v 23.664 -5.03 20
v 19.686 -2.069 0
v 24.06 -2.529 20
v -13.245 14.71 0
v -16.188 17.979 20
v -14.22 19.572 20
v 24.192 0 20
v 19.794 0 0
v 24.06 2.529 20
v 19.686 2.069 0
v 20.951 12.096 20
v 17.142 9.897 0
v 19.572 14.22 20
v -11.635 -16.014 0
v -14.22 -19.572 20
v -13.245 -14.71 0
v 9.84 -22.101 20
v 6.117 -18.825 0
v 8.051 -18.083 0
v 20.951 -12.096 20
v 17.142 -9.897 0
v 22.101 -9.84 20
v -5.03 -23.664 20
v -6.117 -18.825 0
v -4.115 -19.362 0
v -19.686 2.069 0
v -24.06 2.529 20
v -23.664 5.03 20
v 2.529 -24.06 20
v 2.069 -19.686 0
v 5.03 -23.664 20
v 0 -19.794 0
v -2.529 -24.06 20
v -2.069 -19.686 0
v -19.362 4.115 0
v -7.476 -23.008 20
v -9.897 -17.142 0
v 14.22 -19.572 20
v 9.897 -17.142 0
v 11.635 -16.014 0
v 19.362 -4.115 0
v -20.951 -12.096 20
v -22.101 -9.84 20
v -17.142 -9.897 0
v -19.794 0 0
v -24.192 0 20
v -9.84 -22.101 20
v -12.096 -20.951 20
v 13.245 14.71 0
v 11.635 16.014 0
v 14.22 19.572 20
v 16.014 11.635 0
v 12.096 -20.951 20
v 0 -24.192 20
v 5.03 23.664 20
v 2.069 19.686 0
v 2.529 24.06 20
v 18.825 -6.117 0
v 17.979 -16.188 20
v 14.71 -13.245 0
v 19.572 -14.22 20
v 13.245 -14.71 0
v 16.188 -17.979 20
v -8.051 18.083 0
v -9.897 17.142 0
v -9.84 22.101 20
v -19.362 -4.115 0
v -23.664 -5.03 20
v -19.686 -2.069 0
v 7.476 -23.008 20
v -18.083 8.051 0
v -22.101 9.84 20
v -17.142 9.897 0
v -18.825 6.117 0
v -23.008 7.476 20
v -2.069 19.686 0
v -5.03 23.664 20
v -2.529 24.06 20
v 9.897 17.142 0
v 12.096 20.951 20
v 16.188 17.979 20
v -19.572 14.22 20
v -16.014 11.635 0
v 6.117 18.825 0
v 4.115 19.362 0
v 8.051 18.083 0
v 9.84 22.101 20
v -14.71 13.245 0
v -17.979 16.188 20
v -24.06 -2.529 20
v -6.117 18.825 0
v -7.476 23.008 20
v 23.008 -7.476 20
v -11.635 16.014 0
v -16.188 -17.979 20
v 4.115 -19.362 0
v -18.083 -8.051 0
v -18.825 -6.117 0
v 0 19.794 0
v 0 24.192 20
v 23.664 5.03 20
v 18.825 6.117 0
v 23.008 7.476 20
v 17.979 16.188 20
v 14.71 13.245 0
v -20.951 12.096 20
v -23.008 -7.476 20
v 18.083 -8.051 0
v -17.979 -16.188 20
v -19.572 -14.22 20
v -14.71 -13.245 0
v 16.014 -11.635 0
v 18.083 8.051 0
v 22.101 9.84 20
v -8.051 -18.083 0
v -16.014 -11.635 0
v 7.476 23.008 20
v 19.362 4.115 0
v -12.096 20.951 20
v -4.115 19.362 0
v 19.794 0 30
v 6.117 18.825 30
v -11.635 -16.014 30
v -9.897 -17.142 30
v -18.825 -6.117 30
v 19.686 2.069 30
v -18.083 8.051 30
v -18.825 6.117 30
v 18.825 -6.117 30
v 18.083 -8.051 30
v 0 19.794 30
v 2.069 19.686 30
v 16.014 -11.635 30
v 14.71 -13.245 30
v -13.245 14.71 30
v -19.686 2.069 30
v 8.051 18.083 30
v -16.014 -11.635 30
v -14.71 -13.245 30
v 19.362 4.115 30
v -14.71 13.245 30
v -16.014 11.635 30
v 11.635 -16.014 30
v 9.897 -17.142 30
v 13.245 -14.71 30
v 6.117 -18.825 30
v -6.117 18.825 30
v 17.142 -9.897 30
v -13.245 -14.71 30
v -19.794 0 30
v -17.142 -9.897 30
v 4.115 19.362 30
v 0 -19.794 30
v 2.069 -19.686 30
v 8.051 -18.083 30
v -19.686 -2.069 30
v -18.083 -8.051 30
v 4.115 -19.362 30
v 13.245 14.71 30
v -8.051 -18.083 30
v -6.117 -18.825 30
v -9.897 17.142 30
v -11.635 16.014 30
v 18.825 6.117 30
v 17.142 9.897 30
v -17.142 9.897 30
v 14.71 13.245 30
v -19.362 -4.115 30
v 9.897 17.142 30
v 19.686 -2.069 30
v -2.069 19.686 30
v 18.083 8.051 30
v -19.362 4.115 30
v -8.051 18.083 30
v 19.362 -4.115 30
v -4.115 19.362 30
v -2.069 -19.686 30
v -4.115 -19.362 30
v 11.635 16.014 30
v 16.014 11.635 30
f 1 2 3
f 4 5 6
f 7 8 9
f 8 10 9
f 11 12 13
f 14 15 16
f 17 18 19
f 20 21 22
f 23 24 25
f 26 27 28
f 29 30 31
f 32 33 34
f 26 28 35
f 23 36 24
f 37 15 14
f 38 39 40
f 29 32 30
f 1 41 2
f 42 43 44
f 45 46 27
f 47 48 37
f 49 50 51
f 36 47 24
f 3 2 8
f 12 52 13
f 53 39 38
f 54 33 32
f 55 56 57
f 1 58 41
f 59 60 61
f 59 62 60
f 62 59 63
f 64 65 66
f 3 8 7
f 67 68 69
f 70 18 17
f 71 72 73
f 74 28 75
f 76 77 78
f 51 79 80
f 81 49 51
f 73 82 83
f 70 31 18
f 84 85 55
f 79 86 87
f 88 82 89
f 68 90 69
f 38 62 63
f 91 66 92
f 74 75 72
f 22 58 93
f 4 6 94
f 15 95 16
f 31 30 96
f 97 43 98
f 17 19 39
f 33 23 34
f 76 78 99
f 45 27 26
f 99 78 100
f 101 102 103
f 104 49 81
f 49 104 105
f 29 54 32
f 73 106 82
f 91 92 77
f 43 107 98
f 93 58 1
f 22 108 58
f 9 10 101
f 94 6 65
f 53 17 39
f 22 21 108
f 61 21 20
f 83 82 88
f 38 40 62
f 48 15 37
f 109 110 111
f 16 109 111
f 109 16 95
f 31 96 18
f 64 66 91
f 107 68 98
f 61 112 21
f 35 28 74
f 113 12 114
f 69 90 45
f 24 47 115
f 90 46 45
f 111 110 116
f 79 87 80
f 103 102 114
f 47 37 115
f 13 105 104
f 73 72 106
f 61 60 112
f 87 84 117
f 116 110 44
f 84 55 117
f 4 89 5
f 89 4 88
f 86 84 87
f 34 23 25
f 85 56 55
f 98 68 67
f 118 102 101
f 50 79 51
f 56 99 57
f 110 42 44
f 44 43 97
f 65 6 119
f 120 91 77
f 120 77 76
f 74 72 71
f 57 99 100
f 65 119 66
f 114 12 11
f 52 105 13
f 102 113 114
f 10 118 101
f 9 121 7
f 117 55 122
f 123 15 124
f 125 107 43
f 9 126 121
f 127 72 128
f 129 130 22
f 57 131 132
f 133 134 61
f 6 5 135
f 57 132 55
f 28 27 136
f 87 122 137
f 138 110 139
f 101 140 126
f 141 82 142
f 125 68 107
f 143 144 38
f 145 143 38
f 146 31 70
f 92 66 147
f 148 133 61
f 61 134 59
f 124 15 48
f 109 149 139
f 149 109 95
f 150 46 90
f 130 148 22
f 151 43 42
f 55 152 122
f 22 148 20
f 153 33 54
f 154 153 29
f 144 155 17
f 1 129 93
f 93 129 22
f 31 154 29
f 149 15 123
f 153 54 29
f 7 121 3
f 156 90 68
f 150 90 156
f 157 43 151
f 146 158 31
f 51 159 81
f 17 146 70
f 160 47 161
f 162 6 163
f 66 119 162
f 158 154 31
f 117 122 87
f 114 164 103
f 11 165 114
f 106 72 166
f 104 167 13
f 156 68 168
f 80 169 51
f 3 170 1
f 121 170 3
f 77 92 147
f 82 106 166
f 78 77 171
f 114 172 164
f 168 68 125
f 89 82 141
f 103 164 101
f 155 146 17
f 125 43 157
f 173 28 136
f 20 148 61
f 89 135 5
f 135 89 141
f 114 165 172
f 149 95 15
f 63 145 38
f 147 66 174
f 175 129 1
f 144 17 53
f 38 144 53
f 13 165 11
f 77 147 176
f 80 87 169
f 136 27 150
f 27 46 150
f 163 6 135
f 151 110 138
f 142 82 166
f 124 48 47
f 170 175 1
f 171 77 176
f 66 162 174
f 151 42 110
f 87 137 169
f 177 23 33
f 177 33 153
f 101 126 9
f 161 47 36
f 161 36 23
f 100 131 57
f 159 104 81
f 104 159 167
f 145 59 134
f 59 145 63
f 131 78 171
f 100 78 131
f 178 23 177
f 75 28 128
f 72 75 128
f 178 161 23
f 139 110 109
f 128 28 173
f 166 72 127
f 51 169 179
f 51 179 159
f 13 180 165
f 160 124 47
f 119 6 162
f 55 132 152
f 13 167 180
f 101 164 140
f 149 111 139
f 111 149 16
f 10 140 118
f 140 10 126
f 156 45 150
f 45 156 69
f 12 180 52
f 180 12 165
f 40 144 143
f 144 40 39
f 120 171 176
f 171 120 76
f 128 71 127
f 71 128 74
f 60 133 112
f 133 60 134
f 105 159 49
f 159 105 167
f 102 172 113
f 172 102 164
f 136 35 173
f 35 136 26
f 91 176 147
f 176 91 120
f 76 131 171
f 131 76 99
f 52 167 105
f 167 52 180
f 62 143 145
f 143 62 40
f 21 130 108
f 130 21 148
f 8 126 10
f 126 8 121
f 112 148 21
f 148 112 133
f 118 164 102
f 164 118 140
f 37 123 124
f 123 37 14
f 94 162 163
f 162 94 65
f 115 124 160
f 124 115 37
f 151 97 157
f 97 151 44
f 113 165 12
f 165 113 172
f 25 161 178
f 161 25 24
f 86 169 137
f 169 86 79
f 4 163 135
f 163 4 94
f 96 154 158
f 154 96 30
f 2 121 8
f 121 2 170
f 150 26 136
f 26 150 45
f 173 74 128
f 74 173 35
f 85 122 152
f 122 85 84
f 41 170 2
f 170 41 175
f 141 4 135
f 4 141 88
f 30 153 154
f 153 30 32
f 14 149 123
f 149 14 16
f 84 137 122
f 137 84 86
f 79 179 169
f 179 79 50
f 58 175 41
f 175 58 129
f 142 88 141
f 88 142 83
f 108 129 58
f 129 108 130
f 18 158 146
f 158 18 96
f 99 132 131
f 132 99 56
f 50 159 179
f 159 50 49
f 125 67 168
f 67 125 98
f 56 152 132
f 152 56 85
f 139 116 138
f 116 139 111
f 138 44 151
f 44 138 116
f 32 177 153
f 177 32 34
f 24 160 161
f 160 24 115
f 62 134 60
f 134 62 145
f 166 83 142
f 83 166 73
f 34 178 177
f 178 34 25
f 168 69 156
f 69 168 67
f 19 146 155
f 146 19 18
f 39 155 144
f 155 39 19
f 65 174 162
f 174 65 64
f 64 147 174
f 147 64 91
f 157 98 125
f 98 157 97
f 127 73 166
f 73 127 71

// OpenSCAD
// file: ../lib/hull.scad
/*
hull.scad - a library that leverages the hull() procedure
Author: Elliot Williams
github: https://gist.github.com/hexagon5un )
source: https://gist.github.com/hexagon5un/73e187dfa0404c69177795424f397ce6#file-hull-scad

Featured in the hackaday atricle: 'OPENSCAD: TIEING IT TOGETHER WITH HULL()'
https://hackaday.com/2018/02/13/openscad-tieing-it-together-with-hull/
*/
module multiHull(){
	for (i = [1 : $children-1])
		hull(){
			children(0);
			children(i);
		}
}

module sequentialHull(){
	for (i = [0: $children-2])
		hull(){
			children(i);
			children(i+1);
		}
}

/* Extended fun hull functions */ 

module cylinders(points, diameter, thickness){
	for (p=points){
		translate(p) cylinder(d=diameter, h=thickness, center=true);
	}
}

module plate(points, diameter, thickness, hole_diameter){
	difference(){
		hull() cylinders(points, diameter, thickness);
		cylinders(points, hole_diameter, 1000);
	}
}

module bar(length, width, thickness, hole_diameter){
	plate([[0,0,0], [length,0,0]], width, thickness, hole_diameter);
}

module rounded_box(points, radius, height, facets=30){
	hull(){
		for (p = points){
			translate(p)
				cylinder(r=radius, h=height, $fn=facets);
		}
	}
}

module point_cloud(points, radius=1, facets=8){
	for (p=points){
		translate(p)
			sphere(radius/cos(180/facets), $fn=facets);
		// polygon sphere circumscribed on radius
	}
}

module point_hull(points, radius=1, facets=8){
	hull(){
		point_cloud(points, radius, facets);
	}
}

// Shrink the exterior of the points so that the hull fits inside
function select(vector, i) = [ for (p=vector) p[i] ];
function axis_center(v, i) = (max(select(v, i)) - min(select(v,i)))/2;
function center(v) = [ for (i = [0,1,2]) axis_center(v, i) ];
function shrink_point(point, center, radius) = [ for (i = [0,1,2]) point[i] > center[i] ? point[i] - radius : point[i] + radius ]; 
function shrink(points, radius) = [ for (p = points) shrink_point(p, center(points), radius) ];

module interior_point_hull(points, radius=1){
	point_hull(shrink(points, radius), radius);
}

module interior_rounded_box(points, radius, height){
	rounded_box(shrink(points, radius), radius, height);
}


module mirror_copy(v = [1, 0, 0]) {
    children();
    mirror(v) children();
}
// file: ../lib/utils.scad
///< Utilities

function rand_clr() = rands( 0,1,3 );

///< Length conversions
function in2mm( i ) = ( i * 25.4 ); 
function mm2in( m ) = ( m / 25.4 );

/// This is pulled from stackoverflow
/// https://stackoverflow.com/questions/45826208/openscad-rotating-around-a-particular-point

// rotate as per a, v, but around point pt
module rotate_about_pt(a, v, pt) {
    translate(pt)
        rotate(a,v)
            translate(-pt)
                children();   
}
// file: ../lib/math.scad
///< Math scad module


///< Find the hypotenuse from two sides of a right triangle
function hyp_from_sides( a, b ) = sqrt( pow( a, 2 ) + pow( b, 2 ) );

///< Find equal sides from hypotenuse of a right triangle
function sides_from_hyp(h) = sqrt( pow( h, 2 ) / 2 );

///< Find A from hypotenuse and B
function a_from_hb( h, b ) = sqrt( pow( h, 2 ) - pow( b, 2 ) );

function dist_2d( pt2, pt1 ) = sqrt(pow(( pt2[0]-pt1[0] ),2) + pow(( pt2[1]-pt1[1]),2) );

function mid_pt_2d( pt2, pt1 ) = [( pt1[0]+pt2[0] )/2, ( pt1[1]+pt2[1] )/2, 0 ];
///< Test for math functions

A = 3;
B = 4;
echo("Given A=", A, "and B=", B );
H = hyp_from_sides( A, B );
echo("Hypotenuse=", H );
echo("Calc Correct = ", (H == 5) );

echo("Given H=", H, " which is a hypotenuse with equal sides" );
echo( "the sides=", sides_from_hyp( H ) );

echo("Given H=", H, "B=", 4 );
echo("A=", a_from_hb( H, 4 ) );

echo("Distance from [-1,1] and [3,4] = ", dist_2d( [-1,1],[3,4]) );

///< Find the sum of a vector <vect> starting from <s> and continuing to <i>
function sumv( vect, i, s=0 ) = ( i == s ? vect[ i ] : vect[ i ] + sumv( vect, i - 1, s ) );
vec = [ 1, 2, 3, 4 ];
l = len( vec )-1;
echo( "Sum vec = ", sumv( vec, l, 0 ) );

///< Find the average of a vector <vect> starting at <s>
function average( vect, s=0 ) = (len( vect ) == 0 ? 0 : ( sumv( vect, len( vect ) - 1, s )/len(vect) ) );
echo( "Ave vec = ", average( vec ) );
vec2 = [];
echo( "Ave vec2 = ", average( vec2 ) );
// main file
///< Object definition
use <../lib/math.scad>;
use <../lib/utils.scad>;
use <../lib/hull.scad>;

///< Parameters
h   = 10;
$fn = 60;

shaft_measurements = [ 37.86, 37.64, 37.63, 37.53, 37.43, 37.44  ];
average_shaft_size = average( shaft_measurements );
echo( "Average Shaft Size = ", average_shaft_size );

base_measurements = [ 48.38, 48.39 ];
average_base_size = average( base_measurements );
echo( "Average Base Size = ", average_base_size );

///< Modules
module ring( height, width1, width2 ){//, wt1 = 1, wt2 = 1 ){
    color(rand_clr())cylinder( h = height, d1 = width1,    d2 = width2);   
}

///< Build retainer ring
lr_h = h + 10;
shaft_wt = 1;
base_wt  = 2;
shaft_size = average_shaft_size + 2;
difference(){
    union(){
        ring( lr_h, shaft_size, average_base_size );//, wt1 = shaft_wt, wt2 = base_wt );
        translate( [0,0,lr_h+h])
            mirror([0,0,90])
            ring( h, shaft_size, average_base_size );//, wt1 = shaft_wt, wt2 = base_wt );
    }
    shalf_cut = lr_h + h + 0.1;
    color( rand_clr() )cylinder( h = shalf_cut, d = shaft_size );
}
